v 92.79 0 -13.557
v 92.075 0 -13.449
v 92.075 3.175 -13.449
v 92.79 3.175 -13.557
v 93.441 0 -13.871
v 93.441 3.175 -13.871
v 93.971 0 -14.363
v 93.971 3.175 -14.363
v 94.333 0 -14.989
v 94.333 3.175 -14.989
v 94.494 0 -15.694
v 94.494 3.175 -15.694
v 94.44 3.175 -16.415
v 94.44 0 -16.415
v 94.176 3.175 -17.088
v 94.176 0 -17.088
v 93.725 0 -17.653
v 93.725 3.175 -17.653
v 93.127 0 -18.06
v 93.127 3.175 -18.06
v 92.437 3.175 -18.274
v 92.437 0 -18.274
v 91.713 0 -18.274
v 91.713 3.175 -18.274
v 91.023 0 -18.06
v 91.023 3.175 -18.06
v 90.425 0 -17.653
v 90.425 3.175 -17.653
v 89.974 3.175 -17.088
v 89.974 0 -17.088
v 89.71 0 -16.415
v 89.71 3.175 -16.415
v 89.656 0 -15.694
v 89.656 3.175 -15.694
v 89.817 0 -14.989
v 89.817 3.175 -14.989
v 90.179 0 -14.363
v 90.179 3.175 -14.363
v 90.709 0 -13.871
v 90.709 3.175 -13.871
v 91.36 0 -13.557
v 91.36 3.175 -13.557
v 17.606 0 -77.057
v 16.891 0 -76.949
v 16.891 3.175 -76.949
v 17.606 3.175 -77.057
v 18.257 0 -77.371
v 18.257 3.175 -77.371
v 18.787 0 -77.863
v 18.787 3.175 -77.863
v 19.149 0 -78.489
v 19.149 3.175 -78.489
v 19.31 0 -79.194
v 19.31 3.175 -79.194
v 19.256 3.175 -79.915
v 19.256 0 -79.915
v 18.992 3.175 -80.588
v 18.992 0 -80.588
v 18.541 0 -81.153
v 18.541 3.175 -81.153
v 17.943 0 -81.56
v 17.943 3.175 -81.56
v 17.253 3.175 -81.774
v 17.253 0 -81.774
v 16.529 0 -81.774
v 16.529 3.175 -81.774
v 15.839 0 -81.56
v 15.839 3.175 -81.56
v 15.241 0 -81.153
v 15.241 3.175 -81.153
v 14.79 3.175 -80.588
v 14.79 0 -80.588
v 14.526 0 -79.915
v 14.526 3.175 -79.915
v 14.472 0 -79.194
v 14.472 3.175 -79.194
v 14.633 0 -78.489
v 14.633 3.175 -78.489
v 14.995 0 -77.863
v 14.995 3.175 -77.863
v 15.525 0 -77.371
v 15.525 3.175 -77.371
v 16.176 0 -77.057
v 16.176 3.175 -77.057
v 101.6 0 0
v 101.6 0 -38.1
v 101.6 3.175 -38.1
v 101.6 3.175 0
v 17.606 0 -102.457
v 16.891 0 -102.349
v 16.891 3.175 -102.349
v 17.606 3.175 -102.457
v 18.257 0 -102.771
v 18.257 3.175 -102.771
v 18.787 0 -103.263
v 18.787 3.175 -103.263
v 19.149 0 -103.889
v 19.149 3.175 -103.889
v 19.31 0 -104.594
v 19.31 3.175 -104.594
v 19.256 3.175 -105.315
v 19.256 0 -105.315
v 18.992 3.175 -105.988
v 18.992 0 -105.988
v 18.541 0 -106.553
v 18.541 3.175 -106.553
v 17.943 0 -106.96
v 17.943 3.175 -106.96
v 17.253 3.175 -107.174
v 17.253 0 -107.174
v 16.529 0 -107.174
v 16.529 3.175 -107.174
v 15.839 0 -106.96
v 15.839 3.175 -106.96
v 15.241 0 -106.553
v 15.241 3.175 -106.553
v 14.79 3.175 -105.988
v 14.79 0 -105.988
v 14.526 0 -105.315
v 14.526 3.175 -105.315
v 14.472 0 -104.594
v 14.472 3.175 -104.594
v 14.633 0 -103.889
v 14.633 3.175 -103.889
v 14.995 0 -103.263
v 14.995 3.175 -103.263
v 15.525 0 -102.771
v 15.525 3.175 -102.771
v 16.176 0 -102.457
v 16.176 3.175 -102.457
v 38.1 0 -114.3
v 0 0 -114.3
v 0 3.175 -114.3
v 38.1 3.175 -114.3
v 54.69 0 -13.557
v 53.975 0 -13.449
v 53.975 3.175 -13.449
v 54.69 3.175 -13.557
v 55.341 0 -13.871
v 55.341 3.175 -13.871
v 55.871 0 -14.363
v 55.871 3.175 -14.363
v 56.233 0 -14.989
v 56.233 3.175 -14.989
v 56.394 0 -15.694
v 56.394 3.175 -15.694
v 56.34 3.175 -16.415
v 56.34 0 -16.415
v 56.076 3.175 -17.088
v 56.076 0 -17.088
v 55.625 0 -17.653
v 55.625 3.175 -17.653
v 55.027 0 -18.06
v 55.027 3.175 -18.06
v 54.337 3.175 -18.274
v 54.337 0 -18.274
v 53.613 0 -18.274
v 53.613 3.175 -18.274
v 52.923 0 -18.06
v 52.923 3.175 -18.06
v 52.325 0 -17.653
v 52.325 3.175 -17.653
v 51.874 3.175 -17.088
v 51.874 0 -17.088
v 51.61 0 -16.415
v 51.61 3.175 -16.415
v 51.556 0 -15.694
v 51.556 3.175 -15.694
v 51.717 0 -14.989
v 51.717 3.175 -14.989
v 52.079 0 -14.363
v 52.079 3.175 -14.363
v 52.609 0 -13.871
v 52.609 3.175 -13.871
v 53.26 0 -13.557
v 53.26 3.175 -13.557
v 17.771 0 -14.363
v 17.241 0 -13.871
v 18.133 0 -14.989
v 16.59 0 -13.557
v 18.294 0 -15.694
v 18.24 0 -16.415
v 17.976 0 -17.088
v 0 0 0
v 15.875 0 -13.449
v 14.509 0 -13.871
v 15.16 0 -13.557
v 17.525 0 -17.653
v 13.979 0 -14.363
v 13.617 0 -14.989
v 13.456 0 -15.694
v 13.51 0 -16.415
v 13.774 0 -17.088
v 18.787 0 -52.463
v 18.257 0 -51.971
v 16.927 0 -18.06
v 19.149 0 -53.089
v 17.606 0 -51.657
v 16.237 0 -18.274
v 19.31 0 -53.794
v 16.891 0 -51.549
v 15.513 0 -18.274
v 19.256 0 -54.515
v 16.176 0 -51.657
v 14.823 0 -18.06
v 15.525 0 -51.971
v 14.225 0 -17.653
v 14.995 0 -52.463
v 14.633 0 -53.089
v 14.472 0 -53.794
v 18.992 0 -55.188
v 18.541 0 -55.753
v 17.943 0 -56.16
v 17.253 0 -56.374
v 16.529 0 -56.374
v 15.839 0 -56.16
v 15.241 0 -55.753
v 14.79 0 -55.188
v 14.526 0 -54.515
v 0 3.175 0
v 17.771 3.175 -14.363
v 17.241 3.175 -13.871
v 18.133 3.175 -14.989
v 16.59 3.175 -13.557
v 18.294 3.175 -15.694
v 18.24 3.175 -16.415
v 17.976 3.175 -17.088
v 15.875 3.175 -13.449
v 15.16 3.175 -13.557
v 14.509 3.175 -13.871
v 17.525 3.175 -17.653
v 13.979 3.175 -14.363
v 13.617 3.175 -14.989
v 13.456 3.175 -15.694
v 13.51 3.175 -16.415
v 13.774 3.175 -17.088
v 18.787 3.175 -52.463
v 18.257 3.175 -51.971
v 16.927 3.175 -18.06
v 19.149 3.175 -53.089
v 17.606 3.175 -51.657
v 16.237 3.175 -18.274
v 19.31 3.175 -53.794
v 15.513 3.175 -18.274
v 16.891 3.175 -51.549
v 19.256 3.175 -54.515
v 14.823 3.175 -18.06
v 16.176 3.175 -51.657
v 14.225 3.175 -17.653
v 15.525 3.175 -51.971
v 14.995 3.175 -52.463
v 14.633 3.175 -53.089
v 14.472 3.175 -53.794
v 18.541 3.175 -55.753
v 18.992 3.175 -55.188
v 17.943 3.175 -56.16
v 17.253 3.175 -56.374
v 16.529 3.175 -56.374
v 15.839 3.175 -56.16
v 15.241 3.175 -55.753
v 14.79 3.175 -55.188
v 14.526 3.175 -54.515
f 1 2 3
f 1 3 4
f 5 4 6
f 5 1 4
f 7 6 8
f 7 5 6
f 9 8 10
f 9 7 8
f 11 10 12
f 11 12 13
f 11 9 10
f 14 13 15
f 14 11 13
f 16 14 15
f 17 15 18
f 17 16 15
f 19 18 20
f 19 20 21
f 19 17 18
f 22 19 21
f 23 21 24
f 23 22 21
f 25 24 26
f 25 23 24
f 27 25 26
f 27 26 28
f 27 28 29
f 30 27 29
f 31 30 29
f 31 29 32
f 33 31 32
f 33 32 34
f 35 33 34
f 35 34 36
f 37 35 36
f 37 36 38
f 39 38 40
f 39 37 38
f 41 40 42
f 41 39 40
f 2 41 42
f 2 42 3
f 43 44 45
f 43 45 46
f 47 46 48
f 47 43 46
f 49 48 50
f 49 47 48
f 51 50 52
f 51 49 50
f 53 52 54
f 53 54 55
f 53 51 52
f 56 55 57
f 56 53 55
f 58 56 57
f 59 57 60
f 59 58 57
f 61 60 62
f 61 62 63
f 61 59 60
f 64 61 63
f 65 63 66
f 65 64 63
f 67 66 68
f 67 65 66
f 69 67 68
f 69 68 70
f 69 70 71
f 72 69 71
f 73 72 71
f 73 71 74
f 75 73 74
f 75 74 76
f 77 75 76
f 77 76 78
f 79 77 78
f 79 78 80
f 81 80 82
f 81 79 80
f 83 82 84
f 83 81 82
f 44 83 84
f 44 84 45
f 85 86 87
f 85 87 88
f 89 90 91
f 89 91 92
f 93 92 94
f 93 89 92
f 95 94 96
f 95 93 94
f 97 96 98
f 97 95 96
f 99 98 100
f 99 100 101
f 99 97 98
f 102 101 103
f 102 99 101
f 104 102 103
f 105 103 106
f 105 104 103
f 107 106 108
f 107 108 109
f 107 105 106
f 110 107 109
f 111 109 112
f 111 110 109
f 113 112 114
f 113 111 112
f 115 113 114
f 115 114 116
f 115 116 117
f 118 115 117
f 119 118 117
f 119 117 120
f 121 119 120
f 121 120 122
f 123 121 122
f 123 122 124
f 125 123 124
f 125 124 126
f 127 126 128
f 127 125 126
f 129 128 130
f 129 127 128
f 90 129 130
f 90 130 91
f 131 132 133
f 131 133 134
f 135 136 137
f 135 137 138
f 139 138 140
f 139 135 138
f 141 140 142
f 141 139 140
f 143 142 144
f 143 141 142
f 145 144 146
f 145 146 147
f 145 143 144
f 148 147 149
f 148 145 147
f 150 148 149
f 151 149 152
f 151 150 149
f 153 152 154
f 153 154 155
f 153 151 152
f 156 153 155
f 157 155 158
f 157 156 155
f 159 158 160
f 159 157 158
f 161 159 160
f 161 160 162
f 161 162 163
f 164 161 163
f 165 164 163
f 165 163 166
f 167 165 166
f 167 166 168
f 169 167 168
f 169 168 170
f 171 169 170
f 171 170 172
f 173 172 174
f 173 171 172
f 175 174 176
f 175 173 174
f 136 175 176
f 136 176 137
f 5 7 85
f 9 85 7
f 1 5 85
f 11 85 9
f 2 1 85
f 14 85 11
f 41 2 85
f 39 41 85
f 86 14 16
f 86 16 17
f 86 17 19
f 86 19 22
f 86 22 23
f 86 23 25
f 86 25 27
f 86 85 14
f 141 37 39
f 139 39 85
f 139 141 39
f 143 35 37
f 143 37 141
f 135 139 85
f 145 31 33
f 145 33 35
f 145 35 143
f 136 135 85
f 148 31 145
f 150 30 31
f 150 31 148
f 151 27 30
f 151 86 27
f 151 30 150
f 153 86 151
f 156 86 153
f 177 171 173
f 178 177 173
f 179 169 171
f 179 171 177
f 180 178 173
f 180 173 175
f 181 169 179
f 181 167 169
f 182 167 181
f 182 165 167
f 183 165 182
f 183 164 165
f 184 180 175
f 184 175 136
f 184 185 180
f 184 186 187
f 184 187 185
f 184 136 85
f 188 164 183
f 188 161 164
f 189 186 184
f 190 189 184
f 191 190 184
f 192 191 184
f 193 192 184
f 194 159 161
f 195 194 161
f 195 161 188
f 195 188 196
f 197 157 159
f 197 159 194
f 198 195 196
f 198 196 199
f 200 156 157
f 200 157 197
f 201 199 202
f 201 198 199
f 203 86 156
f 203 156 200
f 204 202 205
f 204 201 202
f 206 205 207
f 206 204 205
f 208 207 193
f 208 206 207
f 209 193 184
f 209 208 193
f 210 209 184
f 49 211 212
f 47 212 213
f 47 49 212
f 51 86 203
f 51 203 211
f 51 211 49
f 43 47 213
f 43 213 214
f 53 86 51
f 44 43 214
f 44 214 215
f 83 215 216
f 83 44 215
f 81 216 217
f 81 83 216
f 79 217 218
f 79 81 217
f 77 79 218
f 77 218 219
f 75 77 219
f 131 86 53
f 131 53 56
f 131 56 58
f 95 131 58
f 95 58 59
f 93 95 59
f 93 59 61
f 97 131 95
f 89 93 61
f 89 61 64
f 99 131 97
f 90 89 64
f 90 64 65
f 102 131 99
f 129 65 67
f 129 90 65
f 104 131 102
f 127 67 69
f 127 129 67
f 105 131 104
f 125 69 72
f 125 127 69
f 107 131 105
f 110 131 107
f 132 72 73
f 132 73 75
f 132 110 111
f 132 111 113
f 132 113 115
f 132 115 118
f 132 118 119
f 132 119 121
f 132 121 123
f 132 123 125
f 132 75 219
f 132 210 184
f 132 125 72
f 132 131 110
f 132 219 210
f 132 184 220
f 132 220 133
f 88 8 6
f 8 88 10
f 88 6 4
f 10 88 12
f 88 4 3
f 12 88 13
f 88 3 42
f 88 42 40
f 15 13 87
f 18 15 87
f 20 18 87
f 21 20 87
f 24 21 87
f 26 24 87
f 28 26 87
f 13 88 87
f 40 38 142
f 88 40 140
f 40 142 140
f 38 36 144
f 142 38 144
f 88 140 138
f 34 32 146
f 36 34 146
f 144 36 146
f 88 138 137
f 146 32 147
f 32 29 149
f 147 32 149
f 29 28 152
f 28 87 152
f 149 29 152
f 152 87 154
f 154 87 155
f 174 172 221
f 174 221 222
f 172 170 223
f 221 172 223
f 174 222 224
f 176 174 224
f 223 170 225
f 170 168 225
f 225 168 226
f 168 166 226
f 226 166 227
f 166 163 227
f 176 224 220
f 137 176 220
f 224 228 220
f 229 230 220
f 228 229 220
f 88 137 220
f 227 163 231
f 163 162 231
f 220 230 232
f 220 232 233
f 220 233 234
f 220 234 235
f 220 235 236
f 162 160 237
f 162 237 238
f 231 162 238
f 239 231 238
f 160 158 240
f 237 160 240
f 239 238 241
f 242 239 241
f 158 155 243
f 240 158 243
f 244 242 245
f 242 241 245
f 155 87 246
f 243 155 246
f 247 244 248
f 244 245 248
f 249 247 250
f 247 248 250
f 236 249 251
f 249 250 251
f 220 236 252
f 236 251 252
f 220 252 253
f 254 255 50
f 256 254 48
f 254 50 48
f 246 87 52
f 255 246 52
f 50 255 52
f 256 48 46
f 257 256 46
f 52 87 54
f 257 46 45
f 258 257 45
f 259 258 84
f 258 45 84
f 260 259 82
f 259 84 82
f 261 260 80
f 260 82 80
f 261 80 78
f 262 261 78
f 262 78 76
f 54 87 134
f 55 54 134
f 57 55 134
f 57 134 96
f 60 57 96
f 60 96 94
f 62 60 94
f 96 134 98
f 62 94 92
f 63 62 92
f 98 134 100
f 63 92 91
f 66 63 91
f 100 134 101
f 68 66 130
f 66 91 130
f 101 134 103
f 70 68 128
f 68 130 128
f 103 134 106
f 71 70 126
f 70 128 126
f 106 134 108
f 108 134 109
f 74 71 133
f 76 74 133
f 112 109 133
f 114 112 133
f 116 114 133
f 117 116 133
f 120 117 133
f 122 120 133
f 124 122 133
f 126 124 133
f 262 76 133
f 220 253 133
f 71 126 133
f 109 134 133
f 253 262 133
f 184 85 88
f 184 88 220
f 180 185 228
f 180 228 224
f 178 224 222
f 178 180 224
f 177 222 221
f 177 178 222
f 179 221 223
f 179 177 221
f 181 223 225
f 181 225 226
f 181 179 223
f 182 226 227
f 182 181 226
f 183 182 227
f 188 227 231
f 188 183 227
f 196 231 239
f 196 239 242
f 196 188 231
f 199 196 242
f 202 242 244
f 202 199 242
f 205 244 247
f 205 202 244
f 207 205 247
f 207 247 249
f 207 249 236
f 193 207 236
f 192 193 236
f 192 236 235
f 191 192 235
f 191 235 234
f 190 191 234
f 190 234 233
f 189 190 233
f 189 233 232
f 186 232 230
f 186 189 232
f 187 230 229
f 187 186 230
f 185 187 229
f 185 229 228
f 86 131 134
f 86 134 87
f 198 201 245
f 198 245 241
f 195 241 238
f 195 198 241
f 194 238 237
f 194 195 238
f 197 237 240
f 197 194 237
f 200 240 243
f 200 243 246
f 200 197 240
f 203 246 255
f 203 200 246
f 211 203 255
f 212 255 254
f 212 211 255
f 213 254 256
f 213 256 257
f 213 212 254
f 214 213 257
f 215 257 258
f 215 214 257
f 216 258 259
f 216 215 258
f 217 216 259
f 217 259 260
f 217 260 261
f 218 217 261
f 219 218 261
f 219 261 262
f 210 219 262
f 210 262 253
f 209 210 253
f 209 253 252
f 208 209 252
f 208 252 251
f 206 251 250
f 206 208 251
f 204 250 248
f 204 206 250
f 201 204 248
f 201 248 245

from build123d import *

# Parameters (mm, degrees)
SKETCH1_R           = 2.4257
BOSS_EXTRUDE1_DEPTH = 3.175


with BuildPart() as part:
    # Sketch1 → Boss-Extrude1 (new body)
    with BuildSketch(Plane(origin=(0, 0, 0), x_dir=(1, 0, 0), z_dir=(0, 1, 0))):
        Polygon((0, 0), (0, 114.3), (38.1, 114.3), (101.6, 38.1), (101.6, 0), align=None)
        with Locations(Location((15.875, 15.875, 0), (0, 0, 270))):
            Circle(SKETCH1_R, mode=Mode.SUBTRACT)
        with Locations(Location((53.975, 15.875, 0), (0, 0, 270))):
            Circle(SKETCH1_R, mode=Mode.SUBTRACT)
        with Locations(Location((92.075, 15.875, 0), (0, 0, 270))):
            Circle(SKETCH1_R, mode=Mode.SUBTRACT)
        with Locations(Location((16.891, 53.975, 0), (0, 0, 270))):
            Circle(SKETCH1_R, mode=Mode.SUBTRACT)
        with Locations(Location((16.891, 79.375, 0), (0, 0, 270))):
            Circle(SKETCH1_R, mode=Mode.SUBTRACT)
        with Locations(Location((16.891, 104.775, 0), (0, 0, 270))):
            Circle(SKETCH1_R, mode=Mode.SUBTRACT)
    extrude(amount=BOSS_EXTRUDE1_DEPTH)


solid = part.part
